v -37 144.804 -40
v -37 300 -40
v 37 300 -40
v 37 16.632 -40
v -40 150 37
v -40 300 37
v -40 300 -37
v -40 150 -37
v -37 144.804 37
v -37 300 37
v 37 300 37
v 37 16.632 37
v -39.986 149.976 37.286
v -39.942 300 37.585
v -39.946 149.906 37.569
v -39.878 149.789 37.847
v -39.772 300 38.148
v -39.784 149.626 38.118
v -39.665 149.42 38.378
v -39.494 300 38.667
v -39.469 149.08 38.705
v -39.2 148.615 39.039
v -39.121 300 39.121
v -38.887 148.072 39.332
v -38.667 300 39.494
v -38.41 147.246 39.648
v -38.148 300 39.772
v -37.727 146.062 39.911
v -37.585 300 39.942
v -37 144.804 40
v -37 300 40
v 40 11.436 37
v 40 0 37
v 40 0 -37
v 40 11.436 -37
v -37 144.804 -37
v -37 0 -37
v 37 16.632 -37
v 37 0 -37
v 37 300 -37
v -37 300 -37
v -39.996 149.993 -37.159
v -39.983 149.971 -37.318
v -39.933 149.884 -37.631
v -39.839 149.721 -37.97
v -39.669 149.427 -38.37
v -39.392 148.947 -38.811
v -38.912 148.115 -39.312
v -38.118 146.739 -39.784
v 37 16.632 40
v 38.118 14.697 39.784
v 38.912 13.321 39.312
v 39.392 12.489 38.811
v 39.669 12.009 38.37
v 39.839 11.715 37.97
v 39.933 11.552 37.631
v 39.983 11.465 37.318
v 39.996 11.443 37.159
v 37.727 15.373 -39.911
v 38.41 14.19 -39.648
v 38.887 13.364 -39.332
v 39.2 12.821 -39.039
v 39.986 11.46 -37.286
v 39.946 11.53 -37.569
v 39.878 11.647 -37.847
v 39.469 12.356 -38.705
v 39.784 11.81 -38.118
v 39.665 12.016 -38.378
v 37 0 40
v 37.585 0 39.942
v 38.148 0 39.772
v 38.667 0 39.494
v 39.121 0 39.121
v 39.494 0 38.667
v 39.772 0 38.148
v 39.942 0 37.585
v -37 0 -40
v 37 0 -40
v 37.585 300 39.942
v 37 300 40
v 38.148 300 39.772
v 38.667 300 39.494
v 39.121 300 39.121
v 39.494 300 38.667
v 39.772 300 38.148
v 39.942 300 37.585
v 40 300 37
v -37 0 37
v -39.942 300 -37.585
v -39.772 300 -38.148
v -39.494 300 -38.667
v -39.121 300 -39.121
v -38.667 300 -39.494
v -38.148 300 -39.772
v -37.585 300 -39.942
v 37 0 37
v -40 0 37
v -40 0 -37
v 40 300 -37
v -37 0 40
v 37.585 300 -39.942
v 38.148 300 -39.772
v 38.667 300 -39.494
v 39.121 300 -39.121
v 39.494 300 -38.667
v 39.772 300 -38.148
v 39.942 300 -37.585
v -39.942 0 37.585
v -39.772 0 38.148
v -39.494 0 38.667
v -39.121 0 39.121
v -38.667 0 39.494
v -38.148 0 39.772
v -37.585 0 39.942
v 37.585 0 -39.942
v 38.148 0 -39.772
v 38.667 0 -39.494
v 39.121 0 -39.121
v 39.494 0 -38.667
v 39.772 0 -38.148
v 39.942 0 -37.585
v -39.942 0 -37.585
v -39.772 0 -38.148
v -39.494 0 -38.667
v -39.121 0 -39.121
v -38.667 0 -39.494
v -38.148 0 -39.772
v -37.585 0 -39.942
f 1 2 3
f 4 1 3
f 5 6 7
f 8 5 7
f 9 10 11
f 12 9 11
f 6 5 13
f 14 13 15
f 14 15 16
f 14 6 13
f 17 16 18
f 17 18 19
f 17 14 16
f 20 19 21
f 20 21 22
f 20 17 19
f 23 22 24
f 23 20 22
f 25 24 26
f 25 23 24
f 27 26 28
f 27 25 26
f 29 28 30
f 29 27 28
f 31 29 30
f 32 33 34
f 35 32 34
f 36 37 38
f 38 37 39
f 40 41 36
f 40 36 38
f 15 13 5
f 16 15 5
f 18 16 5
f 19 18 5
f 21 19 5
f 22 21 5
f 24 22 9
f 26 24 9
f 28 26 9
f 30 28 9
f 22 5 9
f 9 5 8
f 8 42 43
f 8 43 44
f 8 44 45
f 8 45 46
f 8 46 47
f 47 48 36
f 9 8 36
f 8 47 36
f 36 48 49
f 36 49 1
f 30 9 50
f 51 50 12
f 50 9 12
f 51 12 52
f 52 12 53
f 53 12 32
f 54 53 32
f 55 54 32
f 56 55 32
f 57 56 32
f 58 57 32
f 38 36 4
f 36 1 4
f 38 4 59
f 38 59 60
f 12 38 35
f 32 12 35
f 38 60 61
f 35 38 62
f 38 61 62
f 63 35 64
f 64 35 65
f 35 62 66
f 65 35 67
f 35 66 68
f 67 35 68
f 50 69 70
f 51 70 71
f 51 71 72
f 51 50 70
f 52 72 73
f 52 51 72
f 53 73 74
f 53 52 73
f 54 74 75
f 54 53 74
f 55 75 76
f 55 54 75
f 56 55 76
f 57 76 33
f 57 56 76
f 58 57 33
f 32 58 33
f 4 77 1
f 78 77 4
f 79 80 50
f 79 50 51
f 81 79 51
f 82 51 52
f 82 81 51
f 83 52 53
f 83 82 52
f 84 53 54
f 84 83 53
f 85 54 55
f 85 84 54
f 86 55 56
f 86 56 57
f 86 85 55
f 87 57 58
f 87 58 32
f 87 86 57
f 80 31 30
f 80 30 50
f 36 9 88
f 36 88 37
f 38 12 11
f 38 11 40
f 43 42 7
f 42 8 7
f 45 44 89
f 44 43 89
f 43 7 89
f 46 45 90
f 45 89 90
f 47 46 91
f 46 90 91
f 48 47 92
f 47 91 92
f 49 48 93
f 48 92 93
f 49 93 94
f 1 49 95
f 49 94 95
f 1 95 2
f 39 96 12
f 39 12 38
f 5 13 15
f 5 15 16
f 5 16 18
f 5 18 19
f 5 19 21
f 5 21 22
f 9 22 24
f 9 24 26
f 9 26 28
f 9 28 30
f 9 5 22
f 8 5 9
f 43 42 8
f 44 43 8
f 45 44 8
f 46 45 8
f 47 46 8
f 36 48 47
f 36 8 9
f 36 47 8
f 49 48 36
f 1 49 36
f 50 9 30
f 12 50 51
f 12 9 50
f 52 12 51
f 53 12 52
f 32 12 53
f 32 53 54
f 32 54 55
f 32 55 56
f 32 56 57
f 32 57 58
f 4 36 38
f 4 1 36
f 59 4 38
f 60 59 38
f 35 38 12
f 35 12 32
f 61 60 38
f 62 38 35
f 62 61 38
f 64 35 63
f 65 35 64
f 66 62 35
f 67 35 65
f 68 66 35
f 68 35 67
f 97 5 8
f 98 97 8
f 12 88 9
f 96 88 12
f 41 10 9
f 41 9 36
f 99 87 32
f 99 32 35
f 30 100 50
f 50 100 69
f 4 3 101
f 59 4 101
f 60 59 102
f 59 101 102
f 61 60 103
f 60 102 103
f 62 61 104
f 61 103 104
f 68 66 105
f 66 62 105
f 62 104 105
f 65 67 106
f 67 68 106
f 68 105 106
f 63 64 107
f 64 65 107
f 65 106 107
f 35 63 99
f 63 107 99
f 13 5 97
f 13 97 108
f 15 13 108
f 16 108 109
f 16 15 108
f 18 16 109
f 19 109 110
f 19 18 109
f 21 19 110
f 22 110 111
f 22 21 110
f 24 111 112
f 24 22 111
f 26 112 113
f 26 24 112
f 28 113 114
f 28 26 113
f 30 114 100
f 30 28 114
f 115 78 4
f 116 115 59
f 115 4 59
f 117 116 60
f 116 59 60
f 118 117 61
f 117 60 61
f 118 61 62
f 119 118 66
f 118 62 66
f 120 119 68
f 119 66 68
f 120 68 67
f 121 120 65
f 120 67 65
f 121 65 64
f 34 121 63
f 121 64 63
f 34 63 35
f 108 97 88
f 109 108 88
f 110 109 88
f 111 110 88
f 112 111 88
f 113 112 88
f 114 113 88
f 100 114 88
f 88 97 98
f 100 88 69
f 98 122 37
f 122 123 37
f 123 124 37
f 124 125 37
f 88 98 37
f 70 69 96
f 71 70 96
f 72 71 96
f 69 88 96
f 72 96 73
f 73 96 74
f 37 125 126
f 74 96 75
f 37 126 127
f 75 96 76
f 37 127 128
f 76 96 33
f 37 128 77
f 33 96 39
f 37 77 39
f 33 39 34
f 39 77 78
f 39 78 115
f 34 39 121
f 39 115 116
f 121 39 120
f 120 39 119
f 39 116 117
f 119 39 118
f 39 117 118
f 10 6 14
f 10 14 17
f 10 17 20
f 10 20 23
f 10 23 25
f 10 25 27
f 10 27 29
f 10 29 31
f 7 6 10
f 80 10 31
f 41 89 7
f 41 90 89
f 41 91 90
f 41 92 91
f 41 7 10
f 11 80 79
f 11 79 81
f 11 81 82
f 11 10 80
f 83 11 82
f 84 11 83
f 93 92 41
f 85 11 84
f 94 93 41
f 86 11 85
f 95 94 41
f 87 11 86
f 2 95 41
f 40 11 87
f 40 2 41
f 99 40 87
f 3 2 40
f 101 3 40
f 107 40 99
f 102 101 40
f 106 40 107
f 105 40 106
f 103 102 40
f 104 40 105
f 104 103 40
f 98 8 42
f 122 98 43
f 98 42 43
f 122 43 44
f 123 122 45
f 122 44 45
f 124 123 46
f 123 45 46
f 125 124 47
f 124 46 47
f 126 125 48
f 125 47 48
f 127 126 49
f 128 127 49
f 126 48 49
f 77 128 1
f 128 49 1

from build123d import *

# Parameters (mm, degrees)
SKETCH_1_W                     = 80
SKETCH_1_H                     = 80
SKETCH_1_W_2                   = 74
SKETCH_1_H_2                   = 74
EXTRUDE_1_DEPTH                = 300
FILLET_1_R                     = 3
SPLIT_BODIES_1_SURFACE_1_BACK  = 321.624
SPLIT_BODIES_1_SURFACE_1_DEPTH = 643.248
SPLIT_BODIES_1_SURFACE_2_BACK  = 321.624
SPLIT_BODIES_1_SURFACE_2_DEPTH = 643.248


with BuildPart() as part:
    # 草图1 → 凸台-拉伸1 (new body)
    with BuildSketch(Plane(origin=(0, 0, 0), x_dir=(1, 0, 0), z_dir=(0, 1, 0))):
        Rectangle(SKETCH_1_W, SKETCH_1_H)
        Rectangle(SKETCH_1_W_2, SKETCH_1_H_2, mode=Mode.SUBTRACT)
    extrude(amount=EXTRUDE_1_DEPTH)

    # 圆角1
    fillet_1_edges = [part.edges().sort_by_distance(p)[0] for p in [
        (40, 150, 40),
        (-40, 150, 40),
        (-40, 150, -40),
        (40, 150, -40),
    ]]
    fillet(fillet_1_edges, radius=FILLET_1_R)


with BuildPart() as body_2:
    # Split Bodies 1: the piece behind the surface
    add(part.part)
    # Split Bodies 1 surface: a surface, the sketch's curves swept straight by 643.248 mm
    with BuildLine(Plane.XY.offset(40).offset(-SPLIT_BODIES_1_SURFACE_1_BACK), mode=Mode.PRIVATE) as split_bodies_1_surface_1_path:
        Line((-40, 150), (46.414872124, 0.325050951))
    split_bodies_1_surface_1 = Shell.extrude(split_bodies_1_surface_1_path.wire(), (0 * SPLIT_BODIES_1_SURFACE_1_DEPTH, 0 * SPLIT_BODIES_1_SURFACE_1_DEPTH, 1 * SPLIT_BODIES_1_SURFACE_1_DEPTH))
    split(bisect_by=split_bodies_1_surface_1, keep=Keep.BOTTOM)


with BuildPart() as part_1:
    add(part.part)

    # Split Bodies 1: split by a surface, the side it looks to stays
    # Split Bodies 1 surface: a surface, the sketch's curves swept straight by 643.248 mm
    with BuildLine(Plane.XY.offset(40).offset(-SPLIT_BODIES_1_SURFACE_2_BACK), mode=Mode.PRIVATE) as split_bodies_1_surface_2_path:
        Line((-40, 150), (46.414872124, 0.325050951))
    split_bodies_1_surface_2 = Shell.extrude(split_bodies_1_surface_2_path.wire(), (0 * SPLIT_BODIES_1_SURFACE_2_DEPTH, 0 * SPLIT_BODIES_1_SURFACE_2_DEPTH, 1 * SPLIT_BODIES_1_SURFACE_2_DEPTH))
    split(bisect_by=split_bodies_1_surface_2, keep=Keep.TOP)


solid = Compound([body_2.part, part_1.part])
